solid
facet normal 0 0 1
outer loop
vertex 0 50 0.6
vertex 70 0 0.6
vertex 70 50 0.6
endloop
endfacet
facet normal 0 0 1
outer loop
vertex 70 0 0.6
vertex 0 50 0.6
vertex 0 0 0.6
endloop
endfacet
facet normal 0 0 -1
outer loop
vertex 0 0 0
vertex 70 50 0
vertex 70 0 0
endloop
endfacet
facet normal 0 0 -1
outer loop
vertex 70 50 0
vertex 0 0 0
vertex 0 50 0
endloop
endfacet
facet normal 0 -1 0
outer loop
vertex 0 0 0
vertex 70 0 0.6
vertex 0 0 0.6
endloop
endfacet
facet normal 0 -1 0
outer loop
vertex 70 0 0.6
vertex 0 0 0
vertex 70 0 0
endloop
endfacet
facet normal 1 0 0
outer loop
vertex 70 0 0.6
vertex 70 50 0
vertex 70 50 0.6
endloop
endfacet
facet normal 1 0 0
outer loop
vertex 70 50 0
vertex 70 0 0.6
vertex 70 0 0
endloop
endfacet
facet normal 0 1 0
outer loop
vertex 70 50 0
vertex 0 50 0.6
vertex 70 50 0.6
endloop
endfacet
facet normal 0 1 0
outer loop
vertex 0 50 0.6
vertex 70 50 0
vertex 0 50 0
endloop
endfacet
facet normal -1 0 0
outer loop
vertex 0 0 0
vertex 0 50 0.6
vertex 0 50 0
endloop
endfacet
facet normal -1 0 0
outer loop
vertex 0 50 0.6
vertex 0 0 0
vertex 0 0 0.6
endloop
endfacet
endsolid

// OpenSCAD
inner_width = 27;
inner_height = 3;
length = 50;

cube([inner_width*2+inner_height*2+10,length,0.6]);
